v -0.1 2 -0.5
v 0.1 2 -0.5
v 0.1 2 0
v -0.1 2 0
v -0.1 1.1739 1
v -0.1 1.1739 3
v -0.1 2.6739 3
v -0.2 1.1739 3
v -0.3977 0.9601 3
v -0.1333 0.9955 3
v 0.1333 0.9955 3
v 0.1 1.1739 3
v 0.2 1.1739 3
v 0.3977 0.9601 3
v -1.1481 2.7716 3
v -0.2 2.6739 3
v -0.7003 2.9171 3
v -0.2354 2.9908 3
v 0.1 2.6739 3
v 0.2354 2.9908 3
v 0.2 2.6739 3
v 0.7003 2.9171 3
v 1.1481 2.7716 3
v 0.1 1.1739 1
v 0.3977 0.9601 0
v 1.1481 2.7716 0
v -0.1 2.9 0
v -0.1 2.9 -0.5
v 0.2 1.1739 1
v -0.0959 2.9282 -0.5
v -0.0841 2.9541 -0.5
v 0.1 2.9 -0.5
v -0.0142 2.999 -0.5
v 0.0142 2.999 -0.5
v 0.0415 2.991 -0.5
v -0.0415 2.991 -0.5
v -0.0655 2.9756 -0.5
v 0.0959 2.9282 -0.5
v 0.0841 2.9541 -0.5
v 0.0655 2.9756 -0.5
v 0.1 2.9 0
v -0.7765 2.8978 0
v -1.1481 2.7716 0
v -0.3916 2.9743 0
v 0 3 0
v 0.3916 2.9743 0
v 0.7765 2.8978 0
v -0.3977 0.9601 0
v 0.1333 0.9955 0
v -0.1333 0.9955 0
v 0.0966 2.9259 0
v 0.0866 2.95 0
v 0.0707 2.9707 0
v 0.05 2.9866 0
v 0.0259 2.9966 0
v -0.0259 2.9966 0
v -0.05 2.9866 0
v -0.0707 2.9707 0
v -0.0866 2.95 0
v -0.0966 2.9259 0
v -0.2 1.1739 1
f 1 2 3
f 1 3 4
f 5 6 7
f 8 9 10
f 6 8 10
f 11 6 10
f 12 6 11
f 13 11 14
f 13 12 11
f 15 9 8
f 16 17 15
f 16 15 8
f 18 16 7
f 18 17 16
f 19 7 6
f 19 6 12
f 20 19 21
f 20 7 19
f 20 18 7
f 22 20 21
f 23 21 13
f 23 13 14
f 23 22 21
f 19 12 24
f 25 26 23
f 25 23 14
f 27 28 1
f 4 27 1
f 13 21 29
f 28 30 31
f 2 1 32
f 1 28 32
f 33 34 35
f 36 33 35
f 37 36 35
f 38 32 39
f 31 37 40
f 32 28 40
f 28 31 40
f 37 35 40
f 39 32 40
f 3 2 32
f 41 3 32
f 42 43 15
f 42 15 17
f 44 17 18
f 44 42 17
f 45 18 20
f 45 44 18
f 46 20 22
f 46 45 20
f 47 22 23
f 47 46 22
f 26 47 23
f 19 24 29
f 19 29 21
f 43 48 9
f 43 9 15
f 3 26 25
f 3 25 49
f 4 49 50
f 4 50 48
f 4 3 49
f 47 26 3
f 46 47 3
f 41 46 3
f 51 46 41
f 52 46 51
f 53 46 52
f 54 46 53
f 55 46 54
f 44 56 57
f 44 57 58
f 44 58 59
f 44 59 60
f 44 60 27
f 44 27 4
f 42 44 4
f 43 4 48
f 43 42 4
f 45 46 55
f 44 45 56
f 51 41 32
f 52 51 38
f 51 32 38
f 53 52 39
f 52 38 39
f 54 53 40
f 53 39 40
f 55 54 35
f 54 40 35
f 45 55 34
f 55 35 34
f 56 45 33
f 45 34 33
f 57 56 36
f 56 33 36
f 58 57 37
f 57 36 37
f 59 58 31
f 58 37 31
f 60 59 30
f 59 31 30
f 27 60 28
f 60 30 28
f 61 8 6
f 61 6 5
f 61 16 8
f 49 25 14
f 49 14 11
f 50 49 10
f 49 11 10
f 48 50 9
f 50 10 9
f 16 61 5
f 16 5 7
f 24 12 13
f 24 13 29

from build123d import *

# Parameters (mm, degrees)
BOSS_EXTRUDE1_DEPTH     = 3
BOSS_EXTRUDE2_DEPTH     = 0.5
CUT_EXTRUDE1_DEPTH      = 0.1
CUT_EXTRUDE1_DEPTH_BACK = 0.3
SKETCH5_W               = 0.2
SKETCH5_H               = 1.5
BOSS_EXTRUDE3_DEPTH     = 3
BOSS_EXTRUDE4_START     = 0.5
BOSS_EXTRUDE4_DEPTH     = 0.5
SKETCH7_R               = 2
CUT_EXTRUDE2_DEPTH      = 3
SKETCH8_W               = 2.825057403
SKETCH8_H               = 1.13922334
CUT_EXTRUDE3_DEPTH      = 0.5
SKETCH9_W               = 2.979299044
SKETCH9_H               = 1.350290847
CUT_EXTRUDE4_DEPTH      = 0.5
SKETCH10_W              = 0.979929186
SKETCH10_H              = 2.841384628
CUT_EXTRUDE5_DEPTH      = 2


with BuildPart() as part:
    # Sketch1 → Boss-Extrude1 (new body)
    with BuildSketch(Plane.XY):
        with BuildLine():
            Line((1.148050297, 2.771638598), (0.382683432, 0.923879533))
            ThreePointArc((0.382683432, 0.923879533), (0, 1), (-0.382683432, 0.923879533))
            Line((-0.382683432, 0.923879533), (-1.148050297, 2.771638598))
            ThreePointArc((-1.148050297, 2.771638598), (0, 3), (1.148050297, 2.771638598))
        make_face()
    extrude(amount=BOSS_EXTRUDE1_DEPTH)

    # Sketch2 → Boss-Extrude2 (add)
    with BuildSketch(Plane.XY.offset(3)):
        with BuildLine():
            Line((-0.1, 2), (-0.1, 2.9))
            ThreePointArc((-0.1, 2.9), (0, 3), (0.1, 2.9))
            Line((0.1, 2.9), (0.1, 2))
            ThreePointArc((0.1, 2), (0, 1.9), (-0.1, 2))
        make_face()
    extrude(amount=BOSS_EXTRUDE2_DEPTH)

    # Sketch4 → Cut-Extrude1 (cut, two sides: drawn at the far end of the back side and taken through both)
    with BuildSketch(Plane(origin=(0.1, 0, 0), x_dir=(0, 0, -1), z_dir=(1, 0, 0)).offset(-CUT_EXTRUDE1_DEPTH_BACK)):
        Polygon((-3, 2.673879533), (-3, 1.173879533), (-1, 1.173879533), align=None)
    extrude(amount=CUT_EXTRUDE1_DEPTH + CUT_EXTRUDE1_DEPTH_BACK, mode=Mode.SUBTRACT)

    # Sketch5 → Boss-Extrude3 (add)
    with BuildSketch(Plane.XY.offset(3)):
        with Locations((0, 1.923879533)):
            Rectangle(SKETCH5_W, SKETCH5_H)
    extrude(amount=-BOSS_EXTRUDE3_DEPTH)

    # Sketch6 → Boss-Extrude4 (add)
    with BuildSketch(Plane(origin=(0, 0, 0), x_dir=(-1, 0, 0), z_dir=(0, 0, -1)).offset(BOSS_EXTRUDE4_START)):
        with BuildLine():
            Line((-0.1, 2), (-0.1, 2.9))
            ThreePointArc((-0.1, 2.9), (0, 3), (0.1, 2.9))
            Line((0.1, 2.9), (0.1, 2))
            ThreePointArc((0.1, 2), (0, 1.9), (-0.1, 2))
        make_face()
    extrude(amount=-BOSS_EXTRUDE4_DEPTH)

    # Sketch7 → Cut-Extrude2 (cut)
    with BuildSketch(Plane.XY.offset(3)):
        with Locations((0, -1)):
            Circle(SKETCH7_R)
    extrude(amount=-CUT_EXTRUDE2_DEPTH, mode=Mode.SUBTRACT)

    # Sketch8 → Cut-Extrude3 (cut)
    with BuildSketch(Plane.XY.offset(3.5)):
        with Locations((0.108239748, 1.43038833)):
            Rectangle(SKETCH8_W, SKETCH8_H)
    extrude(amount=-CUT_EXTRUDE3_DEPTH, mode=Mode.SUBTRACT)

    # Sketch9 → Cut-Extrude4 (cut)
    with BuildSketch(Plane(origin=(0, 0, -0.5), x_dir=(-1, 0, 0), z_dir=(0, 0, -1))):
        with Locations((-0.058178864, 1.324854576)):
            Rectangle(SKETCH9_W, SKETCH9_H)
    extrude(amount=-CUT_EXTRUDE4_DEPTH, mode=Mode.SUBTRACT)

    # Sketch10 → Cut-Extrude5 (cut)
    with BuildSketch(Plane(origin=(0.1, 0, 0), x_dir=(0, 0, -1), z_dir=(1, 0, 0))):
        with Locations((-3.489964593, 2.117386852)):
            Rectangle(SKETCH10_W, SKETCH10_H)
    extrude(amount=-CUT_EXTRUDE5_DEPTH, mode=Mode.SUBTRACT)


solid = part.part
